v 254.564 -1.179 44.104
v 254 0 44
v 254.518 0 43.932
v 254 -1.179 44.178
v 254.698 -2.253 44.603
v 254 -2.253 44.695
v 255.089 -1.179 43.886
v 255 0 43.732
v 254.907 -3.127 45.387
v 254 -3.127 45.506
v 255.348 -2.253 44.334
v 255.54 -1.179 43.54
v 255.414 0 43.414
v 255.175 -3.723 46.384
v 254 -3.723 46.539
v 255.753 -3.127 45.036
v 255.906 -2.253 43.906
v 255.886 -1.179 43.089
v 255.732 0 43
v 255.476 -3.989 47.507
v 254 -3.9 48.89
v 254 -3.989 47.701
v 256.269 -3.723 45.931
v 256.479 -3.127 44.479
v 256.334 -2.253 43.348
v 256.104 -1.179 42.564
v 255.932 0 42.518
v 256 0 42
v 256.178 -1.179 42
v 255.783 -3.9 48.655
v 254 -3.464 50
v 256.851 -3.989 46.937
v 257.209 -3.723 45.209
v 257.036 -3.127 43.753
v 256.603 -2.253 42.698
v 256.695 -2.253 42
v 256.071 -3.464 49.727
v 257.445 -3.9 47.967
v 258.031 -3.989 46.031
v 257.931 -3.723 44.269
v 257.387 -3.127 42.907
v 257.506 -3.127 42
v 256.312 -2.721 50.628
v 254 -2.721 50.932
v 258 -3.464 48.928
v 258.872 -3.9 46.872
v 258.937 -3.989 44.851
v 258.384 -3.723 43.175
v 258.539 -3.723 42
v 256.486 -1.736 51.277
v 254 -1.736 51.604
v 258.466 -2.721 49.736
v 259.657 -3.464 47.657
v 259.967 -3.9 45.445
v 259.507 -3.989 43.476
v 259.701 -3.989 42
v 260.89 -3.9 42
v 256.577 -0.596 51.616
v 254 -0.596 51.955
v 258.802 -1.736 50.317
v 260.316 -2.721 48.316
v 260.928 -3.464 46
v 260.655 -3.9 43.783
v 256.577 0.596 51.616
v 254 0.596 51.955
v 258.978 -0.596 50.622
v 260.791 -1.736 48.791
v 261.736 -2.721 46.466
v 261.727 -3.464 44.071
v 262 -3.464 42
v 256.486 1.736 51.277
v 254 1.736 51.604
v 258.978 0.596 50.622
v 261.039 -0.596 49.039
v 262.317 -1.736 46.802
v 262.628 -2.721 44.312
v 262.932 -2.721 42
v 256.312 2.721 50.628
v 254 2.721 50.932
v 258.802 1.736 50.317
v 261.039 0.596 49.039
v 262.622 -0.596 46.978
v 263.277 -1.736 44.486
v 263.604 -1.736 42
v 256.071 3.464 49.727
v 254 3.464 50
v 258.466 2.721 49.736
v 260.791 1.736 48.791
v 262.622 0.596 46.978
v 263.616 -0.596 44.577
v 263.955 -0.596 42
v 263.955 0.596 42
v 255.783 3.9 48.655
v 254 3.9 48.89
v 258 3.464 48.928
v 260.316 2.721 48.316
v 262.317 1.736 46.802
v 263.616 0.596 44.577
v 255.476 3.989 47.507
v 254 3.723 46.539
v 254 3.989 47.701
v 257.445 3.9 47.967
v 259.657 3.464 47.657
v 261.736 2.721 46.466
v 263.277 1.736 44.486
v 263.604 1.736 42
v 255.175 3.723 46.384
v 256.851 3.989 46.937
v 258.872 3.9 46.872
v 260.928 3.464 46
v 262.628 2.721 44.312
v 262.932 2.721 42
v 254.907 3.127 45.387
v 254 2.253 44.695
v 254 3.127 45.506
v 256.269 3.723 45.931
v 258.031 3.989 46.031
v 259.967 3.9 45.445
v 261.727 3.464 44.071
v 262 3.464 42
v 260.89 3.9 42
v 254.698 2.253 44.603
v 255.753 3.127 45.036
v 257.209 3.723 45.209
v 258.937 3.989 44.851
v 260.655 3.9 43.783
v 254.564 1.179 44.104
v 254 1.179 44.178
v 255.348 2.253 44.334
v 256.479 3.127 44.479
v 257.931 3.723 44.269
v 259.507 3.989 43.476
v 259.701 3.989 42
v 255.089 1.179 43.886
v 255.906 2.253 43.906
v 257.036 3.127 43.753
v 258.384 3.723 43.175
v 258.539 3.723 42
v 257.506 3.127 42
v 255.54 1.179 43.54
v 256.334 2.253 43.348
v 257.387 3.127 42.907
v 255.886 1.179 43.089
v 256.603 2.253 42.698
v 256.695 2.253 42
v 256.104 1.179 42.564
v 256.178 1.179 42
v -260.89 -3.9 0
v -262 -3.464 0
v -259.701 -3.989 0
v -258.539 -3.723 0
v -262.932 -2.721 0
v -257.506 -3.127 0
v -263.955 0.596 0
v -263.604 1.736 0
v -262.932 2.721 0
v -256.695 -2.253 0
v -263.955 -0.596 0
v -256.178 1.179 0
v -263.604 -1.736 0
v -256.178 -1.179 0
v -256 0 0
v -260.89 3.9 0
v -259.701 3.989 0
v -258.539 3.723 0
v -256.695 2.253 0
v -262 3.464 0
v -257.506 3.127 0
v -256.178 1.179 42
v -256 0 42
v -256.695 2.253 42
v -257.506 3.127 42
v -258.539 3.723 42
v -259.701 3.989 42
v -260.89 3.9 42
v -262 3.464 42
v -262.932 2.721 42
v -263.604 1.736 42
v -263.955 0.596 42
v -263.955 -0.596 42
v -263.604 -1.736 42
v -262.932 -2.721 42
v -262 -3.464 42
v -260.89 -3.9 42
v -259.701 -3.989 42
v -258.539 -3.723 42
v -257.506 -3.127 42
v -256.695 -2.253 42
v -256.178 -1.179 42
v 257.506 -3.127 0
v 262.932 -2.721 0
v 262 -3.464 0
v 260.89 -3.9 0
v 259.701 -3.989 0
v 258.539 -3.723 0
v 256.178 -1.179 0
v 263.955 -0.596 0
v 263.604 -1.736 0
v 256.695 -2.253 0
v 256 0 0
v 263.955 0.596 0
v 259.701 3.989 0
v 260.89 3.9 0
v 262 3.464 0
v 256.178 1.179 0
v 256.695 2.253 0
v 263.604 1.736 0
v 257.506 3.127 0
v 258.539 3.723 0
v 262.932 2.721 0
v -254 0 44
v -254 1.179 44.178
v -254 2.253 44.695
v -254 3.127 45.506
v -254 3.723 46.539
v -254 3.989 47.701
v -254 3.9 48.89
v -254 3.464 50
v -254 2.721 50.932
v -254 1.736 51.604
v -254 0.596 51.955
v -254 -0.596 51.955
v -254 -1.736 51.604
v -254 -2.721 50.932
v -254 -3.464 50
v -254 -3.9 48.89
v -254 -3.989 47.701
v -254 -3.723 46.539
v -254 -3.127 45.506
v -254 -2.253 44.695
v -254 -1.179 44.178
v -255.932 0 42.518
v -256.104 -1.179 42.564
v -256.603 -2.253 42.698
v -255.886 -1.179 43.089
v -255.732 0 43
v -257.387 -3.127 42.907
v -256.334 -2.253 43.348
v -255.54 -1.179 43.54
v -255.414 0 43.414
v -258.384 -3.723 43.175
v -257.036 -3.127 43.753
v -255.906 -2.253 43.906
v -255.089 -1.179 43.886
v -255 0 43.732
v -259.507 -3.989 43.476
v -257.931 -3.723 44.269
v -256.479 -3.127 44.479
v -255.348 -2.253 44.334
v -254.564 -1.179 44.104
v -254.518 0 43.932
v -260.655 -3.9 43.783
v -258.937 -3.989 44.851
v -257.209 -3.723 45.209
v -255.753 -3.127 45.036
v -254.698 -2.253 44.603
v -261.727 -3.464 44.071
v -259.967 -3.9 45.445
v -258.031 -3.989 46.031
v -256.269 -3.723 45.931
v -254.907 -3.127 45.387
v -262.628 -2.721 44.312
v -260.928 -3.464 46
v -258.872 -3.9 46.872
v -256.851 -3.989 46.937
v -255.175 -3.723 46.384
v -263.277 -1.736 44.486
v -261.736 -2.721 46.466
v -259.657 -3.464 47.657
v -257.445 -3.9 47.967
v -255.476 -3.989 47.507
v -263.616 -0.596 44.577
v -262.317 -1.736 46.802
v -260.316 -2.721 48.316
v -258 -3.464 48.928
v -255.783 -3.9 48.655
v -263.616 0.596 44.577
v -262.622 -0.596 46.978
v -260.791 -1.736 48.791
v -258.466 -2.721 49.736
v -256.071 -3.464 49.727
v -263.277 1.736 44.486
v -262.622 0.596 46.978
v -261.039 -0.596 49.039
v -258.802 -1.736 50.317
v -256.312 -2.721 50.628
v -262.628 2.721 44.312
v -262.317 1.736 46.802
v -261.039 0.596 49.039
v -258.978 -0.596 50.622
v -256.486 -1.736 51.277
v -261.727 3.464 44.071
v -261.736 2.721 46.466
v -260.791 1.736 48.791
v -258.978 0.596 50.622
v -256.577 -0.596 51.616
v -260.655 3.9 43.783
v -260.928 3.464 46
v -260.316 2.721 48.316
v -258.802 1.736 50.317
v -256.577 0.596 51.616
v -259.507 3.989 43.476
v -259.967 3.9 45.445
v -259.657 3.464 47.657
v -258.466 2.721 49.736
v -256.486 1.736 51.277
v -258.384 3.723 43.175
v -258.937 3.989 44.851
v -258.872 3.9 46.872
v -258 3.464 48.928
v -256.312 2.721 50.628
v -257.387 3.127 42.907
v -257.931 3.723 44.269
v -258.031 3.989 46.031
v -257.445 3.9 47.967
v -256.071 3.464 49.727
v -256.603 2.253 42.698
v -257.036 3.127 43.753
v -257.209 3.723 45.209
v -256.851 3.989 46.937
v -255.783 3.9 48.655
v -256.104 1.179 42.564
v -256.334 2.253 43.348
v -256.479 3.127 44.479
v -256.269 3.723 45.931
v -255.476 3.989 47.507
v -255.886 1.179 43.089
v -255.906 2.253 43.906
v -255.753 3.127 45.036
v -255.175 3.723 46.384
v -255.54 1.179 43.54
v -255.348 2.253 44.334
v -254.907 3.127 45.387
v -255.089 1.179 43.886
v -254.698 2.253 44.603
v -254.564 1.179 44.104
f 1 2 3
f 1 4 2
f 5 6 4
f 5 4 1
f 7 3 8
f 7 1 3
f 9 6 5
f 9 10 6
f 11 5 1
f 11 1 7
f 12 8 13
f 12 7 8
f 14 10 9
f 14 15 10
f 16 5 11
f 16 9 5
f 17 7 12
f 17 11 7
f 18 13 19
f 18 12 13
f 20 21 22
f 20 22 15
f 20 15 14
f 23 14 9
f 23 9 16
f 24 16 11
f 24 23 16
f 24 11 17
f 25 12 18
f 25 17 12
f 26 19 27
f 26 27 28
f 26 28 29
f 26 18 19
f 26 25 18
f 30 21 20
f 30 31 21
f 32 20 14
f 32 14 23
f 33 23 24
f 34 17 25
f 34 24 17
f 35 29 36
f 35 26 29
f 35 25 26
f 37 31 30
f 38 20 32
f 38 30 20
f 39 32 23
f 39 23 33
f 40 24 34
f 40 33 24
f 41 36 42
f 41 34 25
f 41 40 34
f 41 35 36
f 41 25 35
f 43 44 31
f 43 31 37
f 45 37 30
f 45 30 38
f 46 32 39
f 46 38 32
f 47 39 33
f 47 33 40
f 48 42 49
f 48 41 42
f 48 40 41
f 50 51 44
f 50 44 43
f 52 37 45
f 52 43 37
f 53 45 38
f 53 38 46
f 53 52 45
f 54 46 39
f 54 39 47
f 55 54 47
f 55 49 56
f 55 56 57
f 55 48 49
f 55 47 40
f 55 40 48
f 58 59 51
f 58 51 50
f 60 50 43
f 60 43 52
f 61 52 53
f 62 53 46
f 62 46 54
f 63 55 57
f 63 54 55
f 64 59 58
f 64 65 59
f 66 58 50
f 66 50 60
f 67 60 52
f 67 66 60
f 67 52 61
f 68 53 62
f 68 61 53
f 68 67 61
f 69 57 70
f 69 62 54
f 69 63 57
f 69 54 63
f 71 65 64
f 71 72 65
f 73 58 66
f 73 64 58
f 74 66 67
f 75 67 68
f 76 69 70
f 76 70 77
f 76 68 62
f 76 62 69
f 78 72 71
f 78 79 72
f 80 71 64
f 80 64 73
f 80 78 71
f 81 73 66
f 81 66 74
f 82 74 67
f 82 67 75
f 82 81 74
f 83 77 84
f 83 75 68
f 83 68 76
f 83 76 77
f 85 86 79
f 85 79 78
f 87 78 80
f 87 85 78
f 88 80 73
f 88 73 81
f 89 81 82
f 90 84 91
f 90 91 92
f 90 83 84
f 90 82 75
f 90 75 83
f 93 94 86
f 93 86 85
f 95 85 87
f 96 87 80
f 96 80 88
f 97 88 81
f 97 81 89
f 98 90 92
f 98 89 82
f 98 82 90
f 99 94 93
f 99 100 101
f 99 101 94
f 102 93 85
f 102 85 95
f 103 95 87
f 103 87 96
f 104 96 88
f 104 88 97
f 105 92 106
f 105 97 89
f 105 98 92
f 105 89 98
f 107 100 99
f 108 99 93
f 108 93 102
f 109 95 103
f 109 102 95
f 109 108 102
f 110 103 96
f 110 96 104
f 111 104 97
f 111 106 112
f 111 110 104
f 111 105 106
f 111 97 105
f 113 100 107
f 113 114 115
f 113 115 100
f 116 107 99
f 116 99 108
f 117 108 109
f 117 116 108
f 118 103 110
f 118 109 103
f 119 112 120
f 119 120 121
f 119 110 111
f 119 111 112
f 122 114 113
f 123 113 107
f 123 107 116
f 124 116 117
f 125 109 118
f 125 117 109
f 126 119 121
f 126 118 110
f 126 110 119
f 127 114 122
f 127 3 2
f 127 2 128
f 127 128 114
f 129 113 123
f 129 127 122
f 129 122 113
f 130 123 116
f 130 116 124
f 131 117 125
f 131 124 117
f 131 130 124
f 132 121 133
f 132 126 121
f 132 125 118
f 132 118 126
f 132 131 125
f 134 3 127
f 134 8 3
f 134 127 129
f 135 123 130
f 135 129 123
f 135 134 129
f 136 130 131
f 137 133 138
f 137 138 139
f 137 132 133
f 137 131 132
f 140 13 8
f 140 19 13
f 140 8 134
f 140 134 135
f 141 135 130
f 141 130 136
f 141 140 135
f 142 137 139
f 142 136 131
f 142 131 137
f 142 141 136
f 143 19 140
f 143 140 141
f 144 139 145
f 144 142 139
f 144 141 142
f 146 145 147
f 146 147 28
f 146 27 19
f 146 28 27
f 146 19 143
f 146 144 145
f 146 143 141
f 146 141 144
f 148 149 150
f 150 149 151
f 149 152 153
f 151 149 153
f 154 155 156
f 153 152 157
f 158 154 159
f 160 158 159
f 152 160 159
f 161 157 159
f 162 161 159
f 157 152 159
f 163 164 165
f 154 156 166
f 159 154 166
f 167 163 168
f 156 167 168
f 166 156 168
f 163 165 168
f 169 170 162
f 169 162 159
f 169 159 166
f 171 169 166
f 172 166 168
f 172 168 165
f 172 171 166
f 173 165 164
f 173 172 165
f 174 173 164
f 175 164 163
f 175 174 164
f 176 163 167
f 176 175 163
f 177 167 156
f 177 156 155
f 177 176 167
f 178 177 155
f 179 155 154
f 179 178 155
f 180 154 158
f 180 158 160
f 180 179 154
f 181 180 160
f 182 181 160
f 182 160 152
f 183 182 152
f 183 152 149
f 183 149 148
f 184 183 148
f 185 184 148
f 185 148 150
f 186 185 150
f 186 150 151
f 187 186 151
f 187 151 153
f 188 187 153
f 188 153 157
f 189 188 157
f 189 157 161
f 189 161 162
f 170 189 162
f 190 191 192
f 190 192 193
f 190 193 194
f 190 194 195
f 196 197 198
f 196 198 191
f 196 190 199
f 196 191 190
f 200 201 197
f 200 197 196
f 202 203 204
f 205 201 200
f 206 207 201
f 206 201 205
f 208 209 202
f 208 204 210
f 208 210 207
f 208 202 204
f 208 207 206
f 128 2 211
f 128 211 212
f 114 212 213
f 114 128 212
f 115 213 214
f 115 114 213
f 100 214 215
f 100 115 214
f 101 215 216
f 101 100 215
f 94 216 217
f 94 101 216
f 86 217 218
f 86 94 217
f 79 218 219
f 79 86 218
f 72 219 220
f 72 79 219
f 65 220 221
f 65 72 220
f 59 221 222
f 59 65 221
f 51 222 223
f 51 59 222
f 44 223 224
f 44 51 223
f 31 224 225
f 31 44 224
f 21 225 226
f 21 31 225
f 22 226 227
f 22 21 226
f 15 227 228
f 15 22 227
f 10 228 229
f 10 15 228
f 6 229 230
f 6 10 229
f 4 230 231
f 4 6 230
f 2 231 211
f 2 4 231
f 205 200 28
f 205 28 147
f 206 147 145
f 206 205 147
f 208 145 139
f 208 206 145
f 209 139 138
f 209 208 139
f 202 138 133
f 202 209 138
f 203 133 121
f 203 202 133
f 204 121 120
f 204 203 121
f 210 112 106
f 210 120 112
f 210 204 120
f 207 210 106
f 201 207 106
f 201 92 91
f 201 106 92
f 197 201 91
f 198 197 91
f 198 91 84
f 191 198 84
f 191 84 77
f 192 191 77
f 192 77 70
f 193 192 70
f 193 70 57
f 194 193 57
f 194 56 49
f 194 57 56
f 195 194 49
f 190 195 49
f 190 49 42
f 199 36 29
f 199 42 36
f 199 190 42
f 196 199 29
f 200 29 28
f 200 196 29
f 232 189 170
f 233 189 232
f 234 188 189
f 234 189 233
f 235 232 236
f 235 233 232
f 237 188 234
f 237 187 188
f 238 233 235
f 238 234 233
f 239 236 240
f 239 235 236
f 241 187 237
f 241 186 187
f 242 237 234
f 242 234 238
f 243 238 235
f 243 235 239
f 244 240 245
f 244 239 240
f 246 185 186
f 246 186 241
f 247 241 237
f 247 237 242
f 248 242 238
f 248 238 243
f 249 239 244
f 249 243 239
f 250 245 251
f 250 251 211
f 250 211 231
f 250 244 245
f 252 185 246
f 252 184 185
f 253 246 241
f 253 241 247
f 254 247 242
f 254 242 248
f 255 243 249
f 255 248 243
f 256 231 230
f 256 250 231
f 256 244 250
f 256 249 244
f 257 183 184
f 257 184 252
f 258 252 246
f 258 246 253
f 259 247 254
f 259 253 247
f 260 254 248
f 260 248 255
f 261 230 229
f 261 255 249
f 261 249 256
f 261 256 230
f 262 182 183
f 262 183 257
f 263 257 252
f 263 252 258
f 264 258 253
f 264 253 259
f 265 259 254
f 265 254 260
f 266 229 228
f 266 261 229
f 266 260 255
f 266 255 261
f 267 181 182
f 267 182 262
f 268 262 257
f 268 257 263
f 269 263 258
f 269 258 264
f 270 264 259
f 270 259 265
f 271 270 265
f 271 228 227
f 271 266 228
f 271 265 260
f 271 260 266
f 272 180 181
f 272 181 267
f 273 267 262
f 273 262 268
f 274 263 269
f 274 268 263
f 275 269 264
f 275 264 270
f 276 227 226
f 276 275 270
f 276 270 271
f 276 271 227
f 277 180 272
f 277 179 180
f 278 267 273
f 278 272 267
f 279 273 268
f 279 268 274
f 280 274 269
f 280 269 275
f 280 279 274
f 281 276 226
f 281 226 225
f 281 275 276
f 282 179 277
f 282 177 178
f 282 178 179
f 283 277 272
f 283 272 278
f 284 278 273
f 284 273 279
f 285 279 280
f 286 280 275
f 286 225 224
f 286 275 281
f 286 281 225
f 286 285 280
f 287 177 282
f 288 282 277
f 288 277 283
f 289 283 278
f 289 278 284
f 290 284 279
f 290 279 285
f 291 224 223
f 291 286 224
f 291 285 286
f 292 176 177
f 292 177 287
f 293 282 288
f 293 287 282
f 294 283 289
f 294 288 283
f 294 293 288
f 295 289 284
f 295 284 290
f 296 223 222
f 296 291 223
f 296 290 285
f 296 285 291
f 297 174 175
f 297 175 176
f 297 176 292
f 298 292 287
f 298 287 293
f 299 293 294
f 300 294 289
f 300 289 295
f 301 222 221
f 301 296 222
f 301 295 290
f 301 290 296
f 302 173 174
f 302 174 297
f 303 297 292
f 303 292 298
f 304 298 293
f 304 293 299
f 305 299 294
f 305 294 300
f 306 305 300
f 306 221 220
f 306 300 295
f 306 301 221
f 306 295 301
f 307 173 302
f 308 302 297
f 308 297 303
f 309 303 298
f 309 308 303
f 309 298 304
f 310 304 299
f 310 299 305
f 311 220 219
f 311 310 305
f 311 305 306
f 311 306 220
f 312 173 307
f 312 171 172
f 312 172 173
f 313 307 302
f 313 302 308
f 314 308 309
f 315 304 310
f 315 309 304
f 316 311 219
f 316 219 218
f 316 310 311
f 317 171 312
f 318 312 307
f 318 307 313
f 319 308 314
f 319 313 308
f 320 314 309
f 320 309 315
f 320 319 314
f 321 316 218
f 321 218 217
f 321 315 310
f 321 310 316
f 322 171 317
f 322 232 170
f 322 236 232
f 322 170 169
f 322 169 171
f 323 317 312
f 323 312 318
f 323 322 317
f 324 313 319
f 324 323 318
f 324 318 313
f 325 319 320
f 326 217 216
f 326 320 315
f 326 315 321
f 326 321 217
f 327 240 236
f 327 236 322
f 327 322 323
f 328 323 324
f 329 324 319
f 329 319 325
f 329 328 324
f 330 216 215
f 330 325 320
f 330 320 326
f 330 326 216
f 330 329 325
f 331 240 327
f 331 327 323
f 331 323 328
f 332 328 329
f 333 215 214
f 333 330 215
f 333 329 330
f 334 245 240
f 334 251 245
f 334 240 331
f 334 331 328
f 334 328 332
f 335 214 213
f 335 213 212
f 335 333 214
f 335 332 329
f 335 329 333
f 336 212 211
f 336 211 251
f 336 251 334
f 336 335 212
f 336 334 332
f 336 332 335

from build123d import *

# Parameters (mm, degrees)
F1_R = 4


with BuildPart() as f2:
    # F2: sweep along a path in F0
    with BuildLine(Plane.XZ) as f2_path:
        Line((-260, 0), (-260, 42))
        ThreePointArc((-260, 42), (-258.242641, 46.242641), (-254, 48))
        Line((-254, 48), (254, 48))
        ThreePointArc((254, 48), (258.242641, 46.242641), (260, 42))
        Line((260, 42), (260, 0))
    # F1 (on Top) → F2 (sweep)
    with BuildSketch(Plane.XY):
        with Locations((-260, 0)):
            Circle(F1_R)
    sweep(path=f2_path.line)


solid = f2.part
